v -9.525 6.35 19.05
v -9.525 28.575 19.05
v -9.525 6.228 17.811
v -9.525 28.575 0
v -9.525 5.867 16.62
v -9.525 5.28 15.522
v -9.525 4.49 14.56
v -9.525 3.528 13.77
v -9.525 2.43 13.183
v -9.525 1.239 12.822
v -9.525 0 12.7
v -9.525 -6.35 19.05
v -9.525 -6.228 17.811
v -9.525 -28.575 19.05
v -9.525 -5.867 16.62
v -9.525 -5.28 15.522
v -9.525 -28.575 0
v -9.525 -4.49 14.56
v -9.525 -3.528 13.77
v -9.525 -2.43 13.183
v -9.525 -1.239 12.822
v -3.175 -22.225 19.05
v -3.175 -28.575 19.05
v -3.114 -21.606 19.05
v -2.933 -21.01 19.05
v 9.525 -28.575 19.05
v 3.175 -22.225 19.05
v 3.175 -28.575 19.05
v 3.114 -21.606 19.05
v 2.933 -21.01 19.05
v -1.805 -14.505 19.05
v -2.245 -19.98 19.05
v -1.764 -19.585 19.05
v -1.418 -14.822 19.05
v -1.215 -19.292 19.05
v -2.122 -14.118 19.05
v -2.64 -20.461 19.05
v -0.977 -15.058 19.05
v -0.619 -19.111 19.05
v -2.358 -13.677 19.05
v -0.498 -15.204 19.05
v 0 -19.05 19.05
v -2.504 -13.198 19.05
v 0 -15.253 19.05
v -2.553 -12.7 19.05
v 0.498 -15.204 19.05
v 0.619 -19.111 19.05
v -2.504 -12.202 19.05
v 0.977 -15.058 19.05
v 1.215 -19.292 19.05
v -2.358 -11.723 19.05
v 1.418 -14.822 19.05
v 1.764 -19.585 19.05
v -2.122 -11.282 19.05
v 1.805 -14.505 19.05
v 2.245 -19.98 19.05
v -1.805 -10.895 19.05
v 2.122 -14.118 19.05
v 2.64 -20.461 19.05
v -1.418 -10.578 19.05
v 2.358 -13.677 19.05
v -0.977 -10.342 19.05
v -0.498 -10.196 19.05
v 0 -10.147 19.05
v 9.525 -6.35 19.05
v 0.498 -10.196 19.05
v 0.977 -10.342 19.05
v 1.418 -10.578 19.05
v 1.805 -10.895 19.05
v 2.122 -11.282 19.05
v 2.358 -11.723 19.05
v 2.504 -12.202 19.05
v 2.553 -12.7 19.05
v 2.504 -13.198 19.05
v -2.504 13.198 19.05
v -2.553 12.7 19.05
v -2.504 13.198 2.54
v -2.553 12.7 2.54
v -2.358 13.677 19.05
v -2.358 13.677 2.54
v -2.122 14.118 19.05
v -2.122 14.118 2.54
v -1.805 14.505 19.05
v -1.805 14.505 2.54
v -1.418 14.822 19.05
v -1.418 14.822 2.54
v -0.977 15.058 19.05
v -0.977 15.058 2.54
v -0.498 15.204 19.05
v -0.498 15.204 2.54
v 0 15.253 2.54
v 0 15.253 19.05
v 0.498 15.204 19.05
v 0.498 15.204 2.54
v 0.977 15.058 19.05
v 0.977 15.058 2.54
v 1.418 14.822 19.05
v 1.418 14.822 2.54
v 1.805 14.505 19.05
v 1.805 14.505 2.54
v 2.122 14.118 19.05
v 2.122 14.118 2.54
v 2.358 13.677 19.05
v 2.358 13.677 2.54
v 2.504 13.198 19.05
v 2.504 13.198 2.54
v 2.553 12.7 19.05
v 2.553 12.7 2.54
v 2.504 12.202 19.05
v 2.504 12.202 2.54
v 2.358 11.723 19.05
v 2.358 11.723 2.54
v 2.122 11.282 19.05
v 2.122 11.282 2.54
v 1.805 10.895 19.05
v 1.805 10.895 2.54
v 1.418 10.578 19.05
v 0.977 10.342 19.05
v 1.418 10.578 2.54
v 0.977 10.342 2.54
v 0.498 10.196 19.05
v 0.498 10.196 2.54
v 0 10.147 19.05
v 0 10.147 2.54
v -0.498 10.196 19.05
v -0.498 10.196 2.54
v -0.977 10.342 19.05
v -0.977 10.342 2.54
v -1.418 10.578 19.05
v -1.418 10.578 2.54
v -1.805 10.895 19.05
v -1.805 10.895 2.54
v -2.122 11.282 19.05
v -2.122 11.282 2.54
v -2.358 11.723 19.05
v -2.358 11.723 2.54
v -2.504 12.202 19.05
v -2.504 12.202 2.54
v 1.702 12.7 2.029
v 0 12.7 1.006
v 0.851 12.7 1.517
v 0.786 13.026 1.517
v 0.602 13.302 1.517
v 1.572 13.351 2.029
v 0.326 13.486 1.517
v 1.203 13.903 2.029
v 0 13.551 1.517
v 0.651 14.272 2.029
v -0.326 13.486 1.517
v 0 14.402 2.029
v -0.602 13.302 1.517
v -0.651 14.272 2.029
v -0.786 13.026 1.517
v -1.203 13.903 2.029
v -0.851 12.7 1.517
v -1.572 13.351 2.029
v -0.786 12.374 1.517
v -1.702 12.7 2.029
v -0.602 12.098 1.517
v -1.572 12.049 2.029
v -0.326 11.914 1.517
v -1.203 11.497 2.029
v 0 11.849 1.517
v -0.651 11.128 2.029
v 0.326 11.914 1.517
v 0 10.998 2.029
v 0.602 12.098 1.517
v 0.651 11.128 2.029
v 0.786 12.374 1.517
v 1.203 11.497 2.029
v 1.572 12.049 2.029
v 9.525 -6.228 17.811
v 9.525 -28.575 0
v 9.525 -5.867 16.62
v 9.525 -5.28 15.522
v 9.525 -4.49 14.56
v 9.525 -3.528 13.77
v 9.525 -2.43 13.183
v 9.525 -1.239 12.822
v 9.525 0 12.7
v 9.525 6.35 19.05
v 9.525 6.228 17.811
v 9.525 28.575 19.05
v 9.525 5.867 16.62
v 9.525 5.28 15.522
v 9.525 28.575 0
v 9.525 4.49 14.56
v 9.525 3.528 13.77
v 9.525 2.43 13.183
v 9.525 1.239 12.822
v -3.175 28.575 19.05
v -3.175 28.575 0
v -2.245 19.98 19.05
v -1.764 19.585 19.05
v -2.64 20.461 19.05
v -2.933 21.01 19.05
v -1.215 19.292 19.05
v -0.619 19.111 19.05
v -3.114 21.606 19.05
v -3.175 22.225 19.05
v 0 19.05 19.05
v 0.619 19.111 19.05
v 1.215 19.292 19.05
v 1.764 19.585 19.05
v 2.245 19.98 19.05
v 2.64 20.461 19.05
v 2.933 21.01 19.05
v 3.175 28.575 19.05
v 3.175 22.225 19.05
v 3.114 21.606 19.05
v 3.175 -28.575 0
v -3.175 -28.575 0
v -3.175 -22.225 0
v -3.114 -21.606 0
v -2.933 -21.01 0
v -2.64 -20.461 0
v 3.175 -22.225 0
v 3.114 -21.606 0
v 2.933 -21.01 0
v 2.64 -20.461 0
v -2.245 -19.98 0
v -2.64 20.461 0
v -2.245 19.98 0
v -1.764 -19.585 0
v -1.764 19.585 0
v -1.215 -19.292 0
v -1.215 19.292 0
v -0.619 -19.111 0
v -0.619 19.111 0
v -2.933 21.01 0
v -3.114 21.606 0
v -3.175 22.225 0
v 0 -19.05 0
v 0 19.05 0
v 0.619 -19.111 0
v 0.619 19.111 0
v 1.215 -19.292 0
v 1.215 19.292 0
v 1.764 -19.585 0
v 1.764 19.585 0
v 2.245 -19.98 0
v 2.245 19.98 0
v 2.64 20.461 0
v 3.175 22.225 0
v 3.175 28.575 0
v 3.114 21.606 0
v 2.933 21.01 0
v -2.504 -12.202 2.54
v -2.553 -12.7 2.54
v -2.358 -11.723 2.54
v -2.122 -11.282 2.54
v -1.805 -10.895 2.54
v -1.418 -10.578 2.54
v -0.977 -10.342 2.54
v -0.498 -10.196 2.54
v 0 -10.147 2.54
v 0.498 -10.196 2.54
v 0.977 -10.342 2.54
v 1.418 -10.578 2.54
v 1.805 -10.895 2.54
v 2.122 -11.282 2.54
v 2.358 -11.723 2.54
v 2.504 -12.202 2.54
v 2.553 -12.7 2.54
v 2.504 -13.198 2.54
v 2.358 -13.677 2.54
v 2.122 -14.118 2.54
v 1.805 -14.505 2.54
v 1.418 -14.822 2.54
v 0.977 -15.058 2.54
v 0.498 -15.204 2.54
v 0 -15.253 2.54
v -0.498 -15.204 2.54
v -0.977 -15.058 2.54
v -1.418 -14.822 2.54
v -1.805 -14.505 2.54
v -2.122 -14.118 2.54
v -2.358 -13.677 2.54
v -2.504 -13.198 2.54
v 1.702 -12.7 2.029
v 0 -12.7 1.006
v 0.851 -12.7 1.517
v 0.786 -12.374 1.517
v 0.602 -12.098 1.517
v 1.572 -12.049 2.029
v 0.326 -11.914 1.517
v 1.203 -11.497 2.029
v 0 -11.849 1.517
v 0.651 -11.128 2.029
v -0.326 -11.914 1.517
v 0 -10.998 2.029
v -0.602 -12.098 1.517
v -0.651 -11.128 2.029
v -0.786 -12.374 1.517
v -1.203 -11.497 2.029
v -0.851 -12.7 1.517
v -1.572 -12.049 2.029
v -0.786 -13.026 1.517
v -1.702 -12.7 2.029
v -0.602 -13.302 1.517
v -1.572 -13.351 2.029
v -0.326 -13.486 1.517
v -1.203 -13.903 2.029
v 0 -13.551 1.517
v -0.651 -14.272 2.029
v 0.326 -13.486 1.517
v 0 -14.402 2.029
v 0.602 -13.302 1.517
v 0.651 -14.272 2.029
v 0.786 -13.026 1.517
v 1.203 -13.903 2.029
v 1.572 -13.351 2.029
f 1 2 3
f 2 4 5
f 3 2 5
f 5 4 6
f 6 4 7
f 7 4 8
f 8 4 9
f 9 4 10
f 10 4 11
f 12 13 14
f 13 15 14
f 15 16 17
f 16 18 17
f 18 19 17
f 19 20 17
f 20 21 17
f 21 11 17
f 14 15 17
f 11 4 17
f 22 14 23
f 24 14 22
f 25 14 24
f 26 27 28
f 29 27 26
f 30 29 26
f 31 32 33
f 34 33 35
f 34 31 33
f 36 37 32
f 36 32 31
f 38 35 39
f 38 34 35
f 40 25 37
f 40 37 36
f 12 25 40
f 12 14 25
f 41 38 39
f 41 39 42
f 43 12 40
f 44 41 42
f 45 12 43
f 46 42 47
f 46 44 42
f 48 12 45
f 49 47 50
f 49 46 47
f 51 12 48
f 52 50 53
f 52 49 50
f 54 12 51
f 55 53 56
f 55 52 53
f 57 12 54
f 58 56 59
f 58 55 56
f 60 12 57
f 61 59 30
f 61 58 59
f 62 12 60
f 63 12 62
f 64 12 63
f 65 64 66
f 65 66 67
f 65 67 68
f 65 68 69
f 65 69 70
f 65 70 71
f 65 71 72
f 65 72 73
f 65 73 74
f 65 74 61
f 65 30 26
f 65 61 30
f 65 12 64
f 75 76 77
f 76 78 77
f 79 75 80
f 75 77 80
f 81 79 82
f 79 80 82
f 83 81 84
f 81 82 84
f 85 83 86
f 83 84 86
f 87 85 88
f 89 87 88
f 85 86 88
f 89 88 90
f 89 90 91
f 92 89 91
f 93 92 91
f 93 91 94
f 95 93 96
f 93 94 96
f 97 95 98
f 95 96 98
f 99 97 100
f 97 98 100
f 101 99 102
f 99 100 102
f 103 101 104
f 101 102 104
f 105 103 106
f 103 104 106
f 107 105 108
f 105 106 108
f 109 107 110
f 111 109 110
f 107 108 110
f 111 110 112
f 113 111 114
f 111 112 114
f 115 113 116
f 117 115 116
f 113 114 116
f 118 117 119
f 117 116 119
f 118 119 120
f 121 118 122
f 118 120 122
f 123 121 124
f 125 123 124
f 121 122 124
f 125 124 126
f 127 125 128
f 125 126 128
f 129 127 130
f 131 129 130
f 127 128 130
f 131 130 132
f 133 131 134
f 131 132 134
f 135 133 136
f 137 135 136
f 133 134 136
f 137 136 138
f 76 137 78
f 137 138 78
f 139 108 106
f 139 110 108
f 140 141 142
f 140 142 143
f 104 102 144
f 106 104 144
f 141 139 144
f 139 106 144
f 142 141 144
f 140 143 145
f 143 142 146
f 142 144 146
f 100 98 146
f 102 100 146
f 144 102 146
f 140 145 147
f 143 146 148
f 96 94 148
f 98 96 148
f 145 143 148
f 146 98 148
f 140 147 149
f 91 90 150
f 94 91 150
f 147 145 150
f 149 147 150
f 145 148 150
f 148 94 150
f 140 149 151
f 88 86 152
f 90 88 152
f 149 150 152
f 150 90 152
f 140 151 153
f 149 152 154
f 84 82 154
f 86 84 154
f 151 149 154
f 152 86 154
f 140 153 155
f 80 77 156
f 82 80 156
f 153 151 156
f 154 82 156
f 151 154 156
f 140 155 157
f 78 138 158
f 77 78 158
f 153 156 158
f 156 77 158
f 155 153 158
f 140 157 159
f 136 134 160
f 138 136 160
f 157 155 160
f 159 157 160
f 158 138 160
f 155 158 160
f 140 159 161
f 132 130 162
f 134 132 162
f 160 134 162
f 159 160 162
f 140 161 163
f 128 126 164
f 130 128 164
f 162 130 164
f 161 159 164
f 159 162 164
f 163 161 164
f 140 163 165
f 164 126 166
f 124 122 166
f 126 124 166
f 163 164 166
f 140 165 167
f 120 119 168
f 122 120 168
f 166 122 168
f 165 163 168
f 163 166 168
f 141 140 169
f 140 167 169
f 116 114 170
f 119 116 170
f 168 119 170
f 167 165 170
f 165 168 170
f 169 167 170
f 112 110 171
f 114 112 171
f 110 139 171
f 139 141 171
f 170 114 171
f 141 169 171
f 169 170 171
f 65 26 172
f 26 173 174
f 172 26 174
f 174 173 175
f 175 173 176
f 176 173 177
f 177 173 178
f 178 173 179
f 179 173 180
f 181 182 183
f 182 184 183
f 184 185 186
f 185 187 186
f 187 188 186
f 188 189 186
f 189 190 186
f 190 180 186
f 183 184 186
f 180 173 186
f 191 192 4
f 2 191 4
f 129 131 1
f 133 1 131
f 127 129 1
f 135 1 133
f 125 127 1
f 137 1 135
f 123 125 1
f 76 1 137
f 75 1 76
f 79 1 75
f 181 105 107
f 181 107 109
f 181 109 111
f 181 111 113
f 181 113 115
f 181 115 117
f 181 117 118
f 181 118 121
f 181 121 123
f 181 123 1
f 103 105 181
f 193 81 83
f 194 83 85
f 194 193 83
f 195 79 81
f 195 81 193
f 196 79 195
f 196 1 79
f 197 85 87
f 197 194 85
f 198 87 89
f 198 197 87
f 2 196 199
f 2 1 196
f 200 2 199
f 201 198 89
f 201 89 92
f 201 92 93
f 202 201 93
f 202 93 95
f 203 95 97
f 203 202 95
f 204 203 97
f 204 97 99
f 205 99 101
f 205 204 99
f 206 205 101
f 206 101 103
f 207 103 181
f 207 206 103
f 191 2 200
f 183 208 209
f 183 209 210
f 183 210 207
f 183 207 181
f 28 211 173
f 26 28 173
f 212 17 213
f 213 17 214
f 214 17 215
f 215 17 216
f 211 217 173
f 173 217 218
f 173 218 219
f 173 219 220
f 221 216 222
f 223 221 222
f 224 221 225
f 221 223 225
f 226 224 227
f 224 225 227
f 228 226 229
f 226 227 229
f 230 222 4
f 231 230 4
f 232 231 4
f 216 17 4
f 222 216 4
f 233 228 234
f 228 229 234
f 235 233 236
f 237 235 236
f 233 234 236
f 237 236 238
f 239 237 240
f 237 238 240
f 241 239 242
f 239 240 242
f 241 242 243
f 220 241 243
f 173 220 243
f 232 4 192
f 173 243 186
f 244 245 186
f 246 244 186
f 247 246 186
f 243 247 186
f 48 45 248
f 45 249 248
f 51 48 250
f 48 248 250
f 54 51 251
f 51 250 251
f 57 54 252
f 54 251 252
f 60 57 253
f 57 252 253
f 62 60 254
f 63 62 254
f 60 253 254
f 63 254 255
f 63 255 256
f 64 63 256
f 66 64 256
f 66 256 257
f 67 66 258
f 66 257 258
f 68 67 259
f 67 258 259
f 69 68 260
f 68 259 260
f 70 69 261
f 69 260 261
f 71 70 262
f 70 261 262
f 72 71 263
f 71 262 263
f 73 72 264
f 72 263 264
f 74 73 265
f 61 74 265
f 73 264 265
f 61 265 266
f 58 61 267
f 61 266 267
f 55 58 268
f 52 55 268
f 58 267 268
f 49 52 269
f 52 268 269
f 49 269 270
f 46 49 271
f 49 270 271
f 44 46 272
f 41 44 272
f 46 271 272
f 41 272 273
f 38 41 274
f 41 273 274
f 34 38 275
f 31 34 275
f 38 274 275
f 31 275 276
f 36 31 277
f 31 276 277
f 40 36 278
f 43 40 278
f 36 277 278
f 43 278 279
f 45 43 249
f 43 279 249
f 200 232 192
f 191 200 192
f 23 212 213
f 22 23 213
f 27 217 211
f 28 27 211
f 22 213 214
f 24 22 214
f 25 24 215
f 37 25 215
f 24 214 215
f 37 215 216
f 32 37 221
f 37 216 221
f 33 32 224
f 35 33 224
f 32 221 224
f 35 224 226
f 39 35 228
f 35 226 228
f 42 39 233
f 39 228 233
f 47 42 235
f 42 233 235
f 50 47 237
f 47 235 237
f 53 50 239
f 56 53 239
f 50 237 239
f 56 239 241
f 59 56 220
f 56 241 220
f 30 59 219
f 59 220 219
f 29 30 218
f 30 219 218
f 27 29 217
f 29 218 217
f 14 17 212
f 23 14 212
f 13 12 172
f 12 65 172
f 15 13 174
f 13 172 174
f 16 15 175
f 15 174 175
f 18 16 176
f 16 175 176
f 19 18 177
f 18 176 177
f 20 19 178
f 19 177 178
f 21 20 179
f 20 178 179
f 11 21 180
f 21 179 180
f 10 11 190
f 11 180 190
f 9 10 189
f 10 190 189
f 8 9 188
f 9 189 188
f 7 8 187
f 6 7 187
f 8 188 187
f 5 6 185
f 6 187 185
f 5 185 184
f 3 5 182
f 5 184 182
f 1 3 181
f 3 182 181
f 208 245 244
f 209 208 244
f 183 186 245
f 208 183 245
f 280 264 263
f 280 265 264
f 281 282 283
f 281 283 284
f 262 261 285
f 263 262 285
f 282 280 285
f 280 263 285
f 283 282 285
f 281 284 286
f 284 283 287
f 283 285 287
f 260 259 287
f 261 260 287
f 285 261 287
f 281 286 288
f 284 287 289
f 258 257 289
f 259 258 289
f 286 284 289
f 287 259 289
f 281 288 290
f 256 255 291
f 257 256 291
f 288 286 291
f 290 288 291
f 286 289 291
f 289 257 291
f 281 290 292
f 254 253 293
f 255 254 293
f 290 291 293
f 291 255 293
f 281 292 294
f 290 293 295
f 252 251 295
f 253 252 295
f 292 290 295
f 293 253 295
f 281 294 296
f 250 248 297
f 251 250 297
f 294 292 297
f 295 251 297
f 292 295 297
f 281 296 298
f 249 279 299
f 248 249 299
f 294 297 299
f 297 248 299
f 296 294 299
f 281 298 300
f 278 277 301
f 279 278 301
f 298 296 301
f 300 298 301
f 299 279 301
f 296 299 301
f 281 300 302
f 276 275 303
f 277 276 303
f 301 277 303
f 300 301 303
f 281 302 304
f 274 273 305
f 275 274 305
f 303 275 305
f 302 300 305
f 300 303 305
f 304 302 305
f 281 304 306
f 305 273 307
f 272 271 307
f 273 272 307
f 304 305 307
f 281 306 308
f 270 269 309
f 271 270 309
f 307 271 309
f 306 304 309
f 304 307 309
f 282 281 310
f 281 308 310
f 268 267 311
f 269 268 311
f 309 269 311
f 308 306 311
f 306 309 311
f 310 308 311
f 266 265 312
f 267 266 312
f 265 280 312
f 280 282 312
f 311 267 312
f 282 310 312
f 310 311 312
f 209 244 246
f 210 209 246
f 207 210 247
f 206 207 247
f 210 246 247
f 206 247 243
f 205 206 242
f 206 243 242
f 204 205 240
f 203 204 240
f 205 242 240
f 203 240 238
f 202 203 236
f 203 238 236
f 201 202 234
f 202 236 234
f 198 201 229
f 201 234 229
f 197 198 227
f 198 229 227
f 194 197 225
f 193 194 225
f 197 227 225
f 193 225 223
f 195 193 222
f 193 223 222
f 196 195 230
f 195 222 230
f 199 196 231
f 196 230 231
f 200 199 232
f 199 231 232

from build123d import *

# Parameters (mm, degrees)
BOSS_EXTRUDE1_DEPTH         = 19.05
F_1_4_20_TAPPED_HOLE1_D     = 5.1054
F_1_4_20_TAPPED_HOLE1_DEPTH = 16.51
F_1_4_20_TAPPED_HOLE1_TIP   = 1.533816902
SKETCH4_R                   = 6.35
CUT_EXTRUDE1_DEPTH          = 19.05


with BuildPart() as part:
    # Sketch1 → Boss-Extrude1 (new body)
    with BuildSketch(Plane.XY):
        with BuildLine():
            Line((-3.175, -28.575), (-3.175, -22.225))
            ThreePointArc((-3.175, -22.225), (0, -19.05), (3.175, -22.225))
            Line((3.175, -22.225), (3.175, -28.575))
            Line((3.175, -28.575), (9.525, -28.575))
            Line((9.525, -28.575), (9.525, 28.575))
            Line((9.525, 28.575), (3.175, 28.575))
            Line((3.175, 28.575), (3.175, 22.225))
            ThreePointArc((3.175, 22.225), (0, 19.05), (-3.175, 22.225))
            Line((-3.175, 22.225), (-3.175, 28.575))
            Line((-3.175, 28.575), (-9.525, 28.575))
            Line((-9.525, 28.575), (-9.525, -28.575))
            Line((-9.525, -28.575), (-3.175, -28.575))
        make_face()
    extrude(amount=BOSS_EXTRUDE1_DEPTH)

    # 1/4-20 Tapped Hole1
    with Locations(Plane.XY.offset(19.05)):
        with Locations((0, 12.7), (0, -12.7)):
            Hole(F_1_4_20_TAPPED_HOLE1_D / 2, depth=F_1_4_20_TAPPED_HOLE1_DEPTH)
            with Locations((0, 0, -(F_1_4_20_TAPPED_HOLE1_DEPTH + F_1_4_20_TAPPED_HOLE1_TIP / 2))):  # 118° drill point
                Cone(0, F_1_4_20_TAPPED_HOLE1_D / 2, F_1_4_20_TAPPED_HOLE1_TIP, mode=Mode.SUBTRACT)

    # Sketch4 → Cut-Extrude1 (cut)
    with BuildSketch(Plane(origin=(9.525, 0, 0), x_dir=(0, 0, -1), z_dir=(1, 0, 0))):
        with Locations((-19.05, 0)):
            Circle(SKETCH4_R)
    extrude(amount=-CUT_EXTRUDE1_DEPTH, mode=Mode.SUBTRACT)


solid = part.part
